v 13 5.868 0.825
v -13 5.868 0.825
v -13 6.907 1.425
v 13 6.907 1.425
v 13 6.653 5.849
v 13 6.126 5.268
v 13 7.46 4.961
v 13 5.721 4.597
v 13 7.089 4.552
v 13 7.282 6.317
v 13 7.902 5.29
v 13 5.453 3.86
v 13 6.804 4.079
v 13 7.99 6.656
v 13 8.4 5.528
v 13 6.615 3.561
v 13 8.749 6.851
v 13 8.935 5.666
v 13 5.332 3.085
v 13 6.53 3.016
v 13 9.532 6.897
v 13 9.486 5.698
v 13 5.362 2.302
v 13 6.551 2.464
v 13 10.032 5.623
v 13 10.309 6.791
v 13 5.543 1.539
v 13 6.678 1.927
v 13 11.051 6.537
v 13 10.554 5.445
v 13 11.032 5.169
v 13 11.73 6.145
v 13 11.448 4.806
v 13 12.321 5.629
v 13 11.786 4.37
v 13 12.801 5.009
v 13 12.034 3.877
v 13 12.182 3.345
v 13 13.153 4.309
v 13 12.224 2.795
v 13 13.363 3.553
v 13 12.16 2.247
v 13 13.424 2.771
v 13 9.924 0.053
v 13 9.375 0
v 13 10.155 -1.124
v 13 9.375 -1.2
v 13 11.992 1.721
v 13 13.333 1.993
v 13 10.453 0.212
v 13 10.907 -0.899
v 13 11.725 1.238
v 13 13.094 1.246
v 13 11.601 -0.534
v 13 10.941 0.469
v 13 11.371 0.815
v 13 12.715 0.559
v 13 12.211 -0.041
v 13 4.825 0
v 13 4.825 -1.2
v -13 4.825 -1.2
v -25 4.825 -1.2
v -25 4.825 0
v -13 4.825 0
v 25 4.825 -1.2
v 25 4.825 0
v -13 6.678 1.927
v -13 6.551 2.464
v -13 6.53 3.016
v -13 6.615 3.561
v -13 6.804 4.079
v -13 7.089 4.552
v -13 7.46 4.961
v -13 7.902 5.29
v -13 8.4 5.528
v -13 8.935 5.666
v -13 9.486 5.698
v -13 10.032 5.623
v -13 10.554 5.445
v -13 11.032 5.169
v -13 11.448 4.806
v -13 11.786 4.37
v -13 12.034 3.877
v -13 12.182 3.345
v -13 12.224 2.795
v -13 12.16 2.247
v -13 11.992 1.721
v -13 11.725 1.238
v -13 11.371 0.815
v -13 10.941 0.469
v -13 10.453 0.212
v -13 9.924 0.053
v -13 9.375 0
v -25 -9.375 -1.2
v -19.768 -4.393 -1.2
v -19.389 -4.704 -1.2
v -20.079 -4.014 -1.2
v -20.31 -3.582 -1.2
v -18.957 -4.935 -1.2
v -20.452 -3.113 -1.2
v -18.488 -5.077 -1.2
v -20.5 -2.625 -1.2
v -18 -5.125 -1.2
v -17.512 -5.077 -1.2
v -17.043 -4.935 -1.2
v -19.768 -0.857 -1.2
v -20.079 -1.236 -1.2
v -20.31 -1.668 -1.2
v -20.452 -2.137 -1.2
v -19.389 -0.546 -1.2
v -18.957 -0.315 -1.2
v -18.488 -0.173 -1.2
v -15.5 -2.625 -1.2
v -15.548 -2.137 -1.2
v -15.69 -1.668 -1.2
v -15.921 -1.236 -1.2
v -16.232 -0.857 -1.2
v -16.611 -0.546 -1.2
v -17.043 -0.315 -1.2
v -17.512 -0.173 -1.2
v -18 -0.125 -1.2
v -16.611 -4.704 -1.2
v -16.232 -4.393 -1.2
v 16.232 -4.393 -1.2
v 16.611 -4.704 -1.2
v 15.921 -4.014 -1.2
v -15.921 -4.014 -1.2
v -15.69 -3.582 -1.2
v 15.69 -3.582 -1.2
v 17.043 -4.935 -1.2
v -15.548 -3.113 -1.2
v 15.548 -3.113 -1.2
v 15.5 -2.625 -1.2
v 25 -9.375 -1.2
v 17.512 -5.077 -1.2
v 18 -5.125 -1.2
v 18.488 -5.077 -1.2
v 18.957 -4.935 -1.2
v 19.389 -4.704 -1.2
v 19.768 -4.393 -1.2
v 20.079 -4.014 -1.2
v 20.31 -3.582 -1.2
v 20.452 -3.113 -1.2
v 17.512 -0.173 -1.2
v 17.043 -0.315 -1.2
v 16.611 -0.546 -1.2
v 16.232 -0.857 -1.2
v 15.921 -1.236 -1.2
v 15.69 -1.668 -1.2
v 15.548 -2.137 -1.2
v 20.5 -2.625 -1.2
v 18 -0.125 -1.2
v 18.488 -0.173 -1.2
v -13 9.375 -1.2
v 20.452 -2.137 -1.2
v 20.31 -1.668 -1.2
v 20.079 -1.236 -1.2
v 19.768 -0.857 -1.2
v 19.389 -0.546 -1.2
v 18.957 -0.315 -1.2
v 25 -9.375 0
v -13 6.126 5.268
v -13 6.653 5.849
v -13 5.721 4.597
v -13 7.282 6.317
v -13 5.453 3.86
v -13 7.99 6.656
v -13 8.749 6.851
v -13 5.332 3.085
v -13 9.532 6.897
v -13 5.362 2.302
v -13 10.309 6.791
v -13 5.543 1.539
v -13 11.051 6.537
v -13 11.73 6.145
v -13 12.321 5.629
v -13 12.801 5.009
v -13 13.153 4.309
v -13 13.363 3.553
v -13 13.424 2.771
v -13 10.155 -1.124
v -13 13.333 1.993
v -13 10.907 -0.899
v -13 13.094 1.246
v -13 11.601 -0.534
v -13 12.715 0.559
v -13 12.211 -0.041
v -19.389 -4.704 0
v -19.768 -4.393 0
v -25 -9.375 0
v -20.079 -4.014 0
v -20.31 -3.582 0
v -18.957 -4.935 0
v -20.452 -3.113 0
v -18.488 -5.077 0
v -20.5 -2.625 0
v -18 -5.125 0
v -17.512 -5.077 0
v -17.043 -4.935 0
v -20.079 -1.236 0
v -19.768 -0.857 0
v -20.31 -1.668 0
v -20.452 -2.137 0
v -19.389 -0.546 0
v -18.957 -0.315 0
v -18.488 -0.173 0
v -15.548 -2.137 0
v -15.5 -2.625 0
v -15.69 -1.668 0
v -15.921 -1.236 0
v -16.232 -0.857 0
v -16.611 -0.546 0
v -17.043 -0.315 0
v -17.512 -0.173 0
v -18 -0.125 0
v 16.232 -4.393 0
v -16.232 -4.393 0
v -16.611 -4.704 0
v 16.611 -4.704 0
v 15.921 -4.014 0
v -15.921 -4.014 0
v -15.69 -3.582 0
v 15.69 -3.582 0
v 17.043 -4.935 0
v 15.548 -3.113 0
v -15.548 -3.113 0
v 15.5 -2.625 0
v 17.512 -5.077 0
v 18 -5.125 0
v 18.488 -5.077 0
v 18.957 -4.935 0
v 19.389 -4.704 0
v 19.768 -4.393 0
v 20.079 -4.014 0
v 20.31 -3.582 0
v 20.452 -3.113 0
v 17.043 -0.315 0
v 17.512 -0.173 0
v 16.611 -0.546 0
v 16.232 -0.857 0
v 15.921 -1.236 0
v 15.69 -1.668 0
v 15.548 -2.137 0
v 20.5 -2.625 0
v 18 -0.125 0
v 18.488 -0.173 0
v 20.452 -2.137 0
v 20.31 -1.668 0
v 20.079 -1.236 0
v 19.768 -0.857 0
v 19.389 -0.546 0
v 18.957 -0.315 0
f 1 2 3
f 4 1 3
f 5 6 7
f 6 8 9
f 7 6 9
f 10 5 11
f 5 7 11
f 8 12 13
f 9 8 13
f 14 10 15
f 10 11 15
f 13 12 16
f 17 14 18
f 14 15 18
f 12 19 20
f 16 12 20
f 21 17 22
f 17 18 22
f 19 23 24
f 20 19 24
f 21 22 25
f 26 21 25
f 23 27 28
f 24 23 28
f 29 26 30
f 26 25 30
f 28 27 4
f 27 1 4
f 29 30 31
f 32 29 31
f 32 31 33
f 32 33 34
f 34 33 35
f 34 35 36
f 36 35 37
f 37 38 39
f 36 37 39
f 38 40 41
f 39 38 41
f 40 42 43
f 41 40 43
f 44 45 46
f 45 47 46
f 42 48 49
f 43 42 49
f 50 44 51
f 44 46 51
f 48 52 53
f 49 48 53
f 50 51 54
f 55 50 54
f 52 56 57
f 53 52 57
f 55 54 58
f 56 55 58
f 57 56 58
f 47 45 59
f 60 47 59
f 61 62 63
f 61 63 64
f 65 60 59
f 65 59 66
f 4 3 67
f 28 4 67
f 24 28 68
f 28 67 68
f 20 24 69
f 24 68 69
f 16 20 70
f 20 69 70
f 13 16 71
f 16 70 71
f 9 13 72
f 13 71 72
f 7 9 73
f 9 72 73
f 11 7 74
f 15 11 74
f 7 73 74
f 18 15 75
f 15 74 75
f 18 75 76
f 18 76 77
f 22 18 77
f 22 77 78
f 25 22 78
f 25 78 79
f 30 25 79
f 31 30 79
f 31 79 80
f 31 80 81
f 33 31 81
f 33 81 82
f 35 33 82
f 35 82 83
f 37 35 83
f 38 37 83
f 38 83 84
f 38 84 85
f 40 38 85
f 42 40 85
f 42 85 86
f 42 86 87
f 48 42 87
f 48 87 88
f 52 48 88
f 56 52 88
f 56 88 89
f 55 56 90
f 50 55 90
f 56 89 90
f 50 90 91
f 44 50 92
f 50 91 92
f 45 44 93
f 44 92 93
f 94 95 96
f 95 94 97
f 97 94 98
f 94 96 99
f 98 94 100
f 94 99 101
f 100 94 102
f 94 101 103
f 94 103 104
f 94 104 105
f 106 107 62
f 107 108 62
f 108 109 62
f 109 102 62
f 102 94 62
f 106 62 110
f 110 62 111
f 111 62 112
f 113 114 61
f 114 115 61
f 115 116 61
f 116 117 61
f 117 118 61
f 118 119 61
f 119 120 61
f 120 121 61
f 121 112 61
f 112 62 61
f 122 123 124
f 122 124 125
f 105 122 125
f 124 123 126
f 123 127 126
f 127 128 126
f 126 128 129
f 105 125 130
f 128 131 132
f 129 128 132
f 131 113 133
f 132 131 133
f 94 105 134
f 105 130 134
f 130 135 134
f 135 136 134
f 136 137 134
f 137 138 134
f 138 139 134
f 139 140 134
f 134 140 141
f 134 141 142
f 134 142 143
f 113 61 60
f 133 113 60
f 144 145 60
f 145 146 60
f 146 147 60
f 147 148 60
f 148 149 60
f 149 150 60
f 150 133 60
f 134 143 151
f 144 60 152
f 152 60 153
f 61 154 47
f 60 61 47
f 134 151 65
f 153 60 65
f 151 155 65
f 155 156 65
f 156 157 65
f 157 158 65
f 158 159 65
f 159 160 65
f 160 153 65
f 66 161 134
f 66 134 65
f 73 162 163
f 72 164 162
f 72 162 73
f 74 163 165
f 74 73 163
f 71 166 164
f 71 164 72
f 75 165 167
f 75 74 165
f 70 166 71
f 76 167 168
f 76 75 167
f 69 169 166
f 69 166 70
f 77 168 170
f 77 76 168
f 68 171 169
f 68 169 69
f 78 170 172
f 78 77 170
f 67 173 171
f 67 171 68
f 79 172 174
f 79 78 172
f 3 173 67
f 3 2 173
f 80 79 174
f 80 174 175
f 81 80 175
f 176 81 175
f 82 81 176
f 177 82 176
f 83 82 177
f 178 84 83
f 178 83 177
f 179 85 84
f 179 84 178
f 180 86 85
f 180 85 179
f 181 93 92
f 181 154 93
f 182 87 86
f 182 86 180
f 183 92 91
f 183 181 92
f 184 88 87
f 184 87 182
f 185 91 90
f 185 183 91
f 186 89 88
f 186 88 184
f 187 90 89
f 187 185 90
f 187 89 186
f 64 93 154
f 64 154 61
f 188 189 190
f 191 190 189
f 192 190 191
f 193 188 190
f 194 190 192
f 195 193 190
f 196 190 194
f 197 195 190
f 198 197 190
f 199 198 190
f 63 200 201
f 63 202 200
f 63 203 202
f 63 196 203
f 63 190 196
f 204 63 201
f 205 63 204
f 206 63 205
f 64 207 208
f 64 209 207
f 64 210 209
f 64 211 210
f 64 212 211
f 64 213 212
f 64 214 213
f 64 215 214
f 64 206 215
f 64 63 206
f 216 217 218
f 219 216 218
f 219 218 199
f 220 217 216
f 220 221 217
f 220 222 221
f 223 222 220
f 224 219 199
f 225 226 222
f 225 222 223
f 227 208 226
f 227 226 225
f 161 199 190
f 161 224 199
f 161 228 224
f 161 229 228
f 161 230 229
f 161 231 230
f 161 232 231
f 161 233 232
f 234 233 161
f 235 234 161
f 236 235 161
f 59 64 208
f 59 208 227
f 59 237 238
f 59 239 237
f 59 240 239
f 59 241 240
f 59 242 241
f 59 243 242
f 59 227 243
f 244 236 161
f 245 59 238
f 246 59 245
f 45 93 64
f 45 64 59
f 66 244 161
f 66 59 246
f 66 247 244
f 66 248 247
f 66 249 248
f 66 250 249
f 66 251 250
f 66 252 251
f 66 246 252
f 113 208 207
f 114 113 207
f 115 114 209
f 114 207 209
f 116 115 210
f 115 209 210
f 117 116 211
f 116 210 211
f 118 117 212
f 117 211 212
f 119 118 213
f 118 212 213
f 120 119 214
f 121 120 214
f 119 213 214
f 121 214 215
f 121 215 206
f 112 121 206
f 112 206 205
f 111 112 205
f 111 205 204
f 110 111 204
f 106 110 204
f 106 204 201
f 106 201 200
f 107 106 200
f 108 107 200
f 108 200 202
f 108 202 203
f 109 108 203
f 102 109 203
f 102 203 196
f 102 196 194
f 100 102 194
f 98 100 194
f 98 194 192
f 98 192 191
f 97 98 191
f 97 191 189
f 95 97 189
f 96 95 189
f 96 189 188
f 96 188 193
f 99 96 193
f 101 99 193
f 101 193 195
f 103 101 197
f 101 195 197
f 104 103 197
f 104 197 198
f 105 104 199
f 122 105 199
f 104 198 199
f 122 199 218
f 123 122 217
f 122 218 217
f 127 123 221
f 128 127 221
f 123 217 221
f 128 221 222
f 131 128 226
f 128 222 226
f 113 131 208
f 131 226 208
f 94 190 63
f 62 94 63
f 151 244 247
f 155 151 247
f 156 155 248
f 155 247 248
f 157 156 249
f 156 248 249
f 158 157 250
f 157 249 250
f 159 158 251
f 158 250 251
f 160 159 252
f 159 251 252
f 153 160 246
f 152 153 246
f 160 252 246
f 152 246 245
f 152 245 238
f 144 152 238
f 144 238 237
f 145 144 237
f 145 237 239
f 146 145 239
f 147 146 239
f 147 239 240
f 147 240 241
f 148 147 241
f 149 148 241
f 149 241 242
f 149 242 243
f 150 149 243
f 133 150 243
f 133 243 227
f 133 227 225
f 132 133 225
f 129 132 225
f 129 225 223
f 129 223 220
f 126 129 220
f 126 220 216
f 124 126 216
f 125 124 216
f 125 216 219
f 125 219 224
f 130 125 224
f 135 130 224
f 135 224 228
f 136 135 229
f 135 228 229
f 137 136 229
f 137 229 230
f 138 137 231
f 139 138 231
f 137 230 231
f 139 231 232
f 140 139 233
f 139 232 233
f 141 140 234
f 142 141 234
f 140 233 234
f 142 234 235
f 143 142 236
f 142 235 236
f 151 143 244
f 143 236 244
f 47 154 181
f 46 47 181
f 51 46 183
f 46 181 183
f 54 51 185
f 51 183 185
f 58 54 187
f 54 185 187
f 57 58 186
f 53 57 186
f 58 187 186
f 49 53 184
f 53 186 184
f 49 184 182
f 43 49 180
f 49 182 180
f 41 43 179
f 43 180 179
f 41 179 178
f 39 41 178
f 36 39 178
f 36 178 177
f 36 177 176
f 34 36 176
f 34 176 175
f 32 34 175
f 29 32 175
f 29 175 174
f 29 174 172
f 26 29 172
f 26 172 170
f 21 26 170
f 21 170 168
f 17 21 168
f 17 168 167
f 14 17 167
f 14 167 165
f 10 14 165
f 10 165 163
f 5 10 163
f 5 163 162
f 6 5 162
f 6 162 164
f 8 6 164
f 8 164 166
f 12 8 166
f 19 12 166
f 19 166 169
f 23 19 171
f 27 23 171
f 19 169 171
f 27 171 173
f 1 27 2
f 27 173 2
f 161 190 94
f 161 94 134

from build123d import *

# Parameters (mm, degrees)
SKETCH_1_W               = 50
SKETCH_1_H               = 18.75
SM_BASE_FLANGE_1_DEPTH   = 1.2
OTHER_START              = -25
OTHER_1_DEPTH            = 50
SKETCH_12_R              = 2.5
CUT_EXTRUDE_3_DEPTH      = 10
CUT_EXTRUDE_1_DEPTH      = 30.203435157
CUT_EXTRUDE_1_DEPTH_BACK = 30.203435157
SKETCH_10_W              = 12
SKETCH_10_H              = 8.6


# Read off the part's stored shape, not the designer's step: 褶边1
# Sheet-metal steps are written as plain solids
with BuildPart() as part:
    # Sketch 1 → 基体-法兰1 (new body)
    with BuildSketch(Plane.XY):
        Rectangle(SKETCH_1_W, SKETCH_1_H)
    extrude(amount=-SM_BASE_FLANGE_1_DEPTH)

    # Other 1 outline → Other 1 (add)
    with BuildSketch(Plane.YZ.offset(OTHER_START)):
        with BuildLine():
            Line((5.867597115, 0.825), (6.906827599, 1.425))
            ThreePointArc((6.906827599, 1.425), (10.8, 5.318172401), (9.375, 0))
            Line((9.375, 0), (9.375, -1.2))
            ThreePointArc((9.375, -1.2), (11.4, 6.357402885), (5.867597115, 0.825))
        make_face()
    extrude(amount=OTHER_1_DEPTH)

    # 草图12 → 切除-拉伸3 (cut)
    with BuildSketch(Plane.XY):
        with Locations((-18, -2.625)):
            Circle(SKETCH_12_R)
        with Locations((18, -2.625)):
            Circle(SKETCH_12_R)
    extrude(amount=-CUT_EXTRUDE_3_DEPTH, mode=Mode.SUBTRACT)

    # 草图10 → 切除-拉伸1 (cut, two sides: drawn at the far end of the back side and taken through both)
    with BuildSketch(Plane.XY.offset(-CUT_EXTRUDE_1_DEPTH_BACK)):
        with Locations((-19, 9.125)):
            Rectangle(SKETCH_10_W, SKETCH_10_H)
        with Locations((19, 9.125)):
            Rectangle(SKETCH_10_W, SKETCH_10_H)
    extrude(amount=CUT_EXTRUDE_1_DEPTH + CUT_EXTRUDE_1_DEPTH_BACK, mode=Mode.SUBTRACT)


solid = part.part
